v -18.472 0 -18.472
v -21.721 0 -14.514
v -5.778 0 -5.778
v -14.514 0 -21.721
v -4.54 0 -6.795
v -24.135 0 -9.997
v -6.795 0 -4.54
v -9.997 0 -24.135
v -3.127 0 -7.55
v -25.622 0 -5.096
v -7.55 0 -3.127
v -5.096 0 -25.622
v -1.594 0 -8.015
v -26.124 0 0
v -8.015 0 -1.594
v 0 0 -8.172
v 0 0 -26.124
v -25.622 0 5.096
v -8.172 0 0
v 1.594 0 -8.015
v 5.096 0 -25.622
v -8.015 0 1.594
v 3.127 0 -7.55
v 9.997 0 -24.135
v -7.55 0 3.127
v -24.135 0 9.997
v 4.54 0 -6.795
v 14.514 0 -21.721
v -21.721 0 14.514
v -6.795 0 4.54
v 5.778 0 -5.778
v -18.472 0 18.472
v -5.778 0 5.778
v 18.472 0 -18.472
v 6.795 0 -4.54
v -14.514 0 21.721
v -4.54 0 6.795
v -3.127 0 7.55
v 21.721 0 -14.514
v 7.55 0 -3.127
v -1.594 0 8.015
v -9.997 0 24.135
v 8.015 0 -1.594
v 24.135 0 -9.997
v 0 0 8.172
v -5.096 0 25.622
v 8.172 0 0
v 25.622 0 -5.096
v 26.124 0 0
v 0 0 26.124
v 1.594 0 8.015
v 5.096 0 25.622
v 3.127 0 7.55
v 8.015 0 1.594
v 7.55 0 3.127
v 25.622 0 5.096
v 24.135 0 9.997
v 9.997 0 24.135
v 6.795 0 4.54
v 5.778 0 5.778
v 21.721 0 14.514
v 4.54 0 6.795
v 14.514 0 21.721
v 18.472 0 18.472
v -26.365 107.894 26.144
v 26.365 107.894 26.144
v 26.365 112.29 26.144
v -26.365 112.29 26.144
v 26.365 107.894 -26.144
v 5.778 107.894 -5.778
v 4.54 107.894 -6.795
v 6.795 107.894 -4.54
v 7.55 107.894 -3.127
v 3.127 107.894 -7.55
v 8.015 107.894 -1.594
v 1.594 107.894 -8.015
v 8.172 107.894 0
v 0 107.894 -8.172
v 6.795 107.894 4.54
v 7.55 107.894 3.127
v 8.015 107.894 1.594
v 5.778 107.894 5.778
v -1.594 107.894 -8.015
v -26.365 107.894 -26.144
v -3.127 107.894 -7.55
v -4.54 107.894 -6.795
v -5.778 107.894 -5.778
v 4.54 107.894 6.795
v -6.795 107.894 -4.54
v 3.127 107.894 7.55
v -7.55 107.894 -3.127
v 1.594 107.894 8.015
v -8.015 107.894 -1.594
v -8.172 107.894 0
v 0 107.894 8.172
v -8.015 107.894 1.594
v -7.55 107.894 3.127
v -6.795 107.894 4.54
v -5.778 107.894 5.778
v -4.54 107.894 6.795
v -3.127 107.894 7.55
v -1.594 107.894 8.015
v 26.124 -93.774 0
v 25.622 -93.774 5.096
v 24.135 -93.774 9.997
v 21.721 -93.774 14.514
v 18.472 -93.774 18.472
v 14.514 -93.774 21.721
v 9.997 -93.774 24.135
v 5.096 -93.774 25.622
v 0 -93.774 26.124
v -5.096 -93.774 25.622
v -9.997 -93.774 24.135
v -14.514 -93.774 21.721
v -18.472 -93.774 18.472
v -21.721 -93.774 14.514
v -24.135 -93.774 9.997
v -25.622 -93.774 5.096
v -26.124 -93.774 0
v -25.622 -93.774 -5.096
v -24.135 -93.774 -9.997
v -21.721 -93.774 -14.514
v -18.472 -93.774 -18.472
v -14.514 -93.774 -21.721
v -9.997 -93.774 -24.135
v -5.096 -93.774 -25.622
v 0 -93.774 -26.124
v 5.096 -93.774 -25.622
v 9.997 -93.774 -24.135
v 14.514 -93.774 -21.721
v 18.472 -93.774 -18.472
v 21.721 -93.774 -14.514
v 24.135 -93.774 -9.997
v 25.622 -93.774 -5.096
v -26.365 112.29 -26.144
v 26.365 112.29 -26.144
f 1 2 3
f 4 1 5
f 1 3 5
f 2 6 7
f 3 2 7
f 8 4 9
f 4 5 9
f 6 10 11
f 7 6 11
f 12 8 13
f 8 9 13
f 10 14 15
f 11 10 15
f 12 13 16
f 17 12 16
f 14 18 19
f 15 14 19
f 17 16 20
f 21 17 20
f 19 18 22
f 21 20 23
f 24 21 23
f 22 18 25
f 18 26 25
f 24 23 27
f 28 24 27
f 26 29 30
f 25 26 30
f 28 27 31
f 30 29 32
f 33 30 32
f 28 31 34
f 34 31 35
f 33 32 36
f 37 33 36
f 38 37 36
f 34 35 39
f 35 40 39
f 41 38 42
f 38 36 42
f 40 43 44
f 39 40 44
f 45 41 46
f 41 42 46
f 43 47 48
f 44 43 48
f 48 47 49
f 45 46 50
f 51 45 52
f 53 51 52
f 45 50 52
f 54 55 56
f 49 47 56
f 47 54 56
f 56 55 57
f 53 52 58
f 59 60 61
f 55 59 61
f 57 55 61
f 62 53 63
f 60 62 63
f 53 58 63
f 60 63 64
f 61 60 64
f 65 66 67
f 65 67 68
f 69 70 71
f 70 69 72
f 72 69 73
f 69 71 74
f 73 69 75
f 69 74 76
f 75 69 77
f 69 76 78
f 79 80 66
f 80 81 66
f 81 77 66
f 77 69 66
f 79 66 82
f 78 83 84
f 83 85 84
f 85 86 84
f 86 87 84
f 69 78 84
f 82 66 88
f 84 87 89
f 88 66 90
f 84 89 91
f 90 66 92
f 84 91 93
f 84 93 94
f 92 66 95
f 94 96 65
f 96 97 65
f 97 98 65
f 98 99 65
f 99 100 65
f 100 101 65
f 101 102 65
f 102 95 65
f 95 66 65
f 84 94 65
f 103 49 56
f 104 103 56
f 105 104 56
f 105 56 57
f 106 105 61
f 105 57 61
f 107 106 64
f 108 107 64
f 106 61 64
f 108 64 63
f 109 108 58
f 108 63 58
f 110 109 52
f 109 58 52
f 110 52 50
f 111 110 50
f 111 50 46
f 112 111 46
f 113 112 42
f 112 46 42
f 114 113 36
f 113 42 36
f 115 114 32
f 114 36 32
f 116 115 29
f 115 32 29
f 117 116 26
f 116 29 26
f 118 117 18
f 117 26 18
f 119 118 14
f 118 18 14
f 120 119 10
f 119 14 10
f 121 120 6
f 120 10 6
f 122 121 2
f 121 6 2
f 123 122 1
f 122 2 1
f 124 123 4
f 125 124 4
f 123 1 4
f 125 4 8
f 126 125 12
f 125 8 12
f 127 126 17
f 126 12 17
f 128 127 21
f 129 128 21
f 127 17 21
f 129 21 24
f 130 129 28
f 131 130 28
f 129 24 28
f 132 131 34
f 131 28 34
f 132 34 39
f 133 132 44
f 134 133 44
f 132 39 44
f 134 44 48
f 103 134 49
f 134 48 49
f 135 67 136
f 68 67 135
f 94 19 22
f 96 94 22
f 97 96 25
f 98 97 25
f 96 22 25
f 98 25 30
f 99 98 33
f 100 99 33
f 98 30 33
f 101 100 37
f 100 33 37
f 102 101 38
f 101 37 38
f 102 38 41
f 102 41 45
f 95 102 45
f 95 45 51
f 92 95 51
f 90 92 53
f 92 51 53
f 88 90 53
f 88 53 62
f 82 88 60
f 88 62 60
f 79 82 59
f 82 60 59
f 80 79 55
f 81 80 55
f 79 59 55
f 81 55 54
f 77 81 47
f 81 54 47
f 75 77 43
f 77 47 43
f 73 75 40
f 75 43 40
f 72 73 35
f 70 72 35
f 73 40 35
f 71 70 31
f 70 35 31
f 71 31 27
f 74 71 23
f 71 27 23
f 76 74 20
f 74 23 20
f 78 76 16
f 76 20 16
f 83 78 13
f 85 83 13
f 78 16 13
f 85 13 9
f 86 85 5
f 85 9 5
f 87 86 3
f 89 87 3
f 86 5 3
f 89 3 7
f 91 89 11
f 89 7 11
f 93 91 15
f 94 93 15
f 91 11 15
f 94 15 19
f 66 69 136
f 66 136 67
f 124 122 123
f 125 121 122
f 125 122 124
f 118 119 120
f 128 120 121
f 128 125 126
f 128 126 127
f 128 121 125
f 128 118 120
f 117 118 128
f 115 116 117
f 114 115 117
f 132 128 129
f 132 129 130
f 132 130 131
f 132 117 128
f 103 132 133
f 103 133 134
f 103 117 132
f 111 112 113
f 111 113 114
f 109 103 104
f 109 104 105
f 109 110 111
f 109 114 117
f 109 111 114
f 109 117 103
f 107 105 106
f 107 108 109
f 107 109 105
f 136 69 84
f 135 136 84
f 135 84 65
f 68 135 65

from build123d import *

# Parameters (mm, degrees)
F0_R     = 26.123678
F1_DEPTH = 93.77381
F2_R     = 8.171962
F3_DEPTH = 107.8945
F4_W     = 52.7304
F4_H     = 52.288964
F5_DEPTH = 4.39529


with BuildPart() as f1:
    # F0 (on Front) → F1 (new body)
    with BuildSketch(Plane.XZ):
        Circle(F0_R)
    extrude(amount=F1_DEPTH)

    # F2 (on face) → F3 (join)
    with BuildSketch(Plane(origin=(0, 0, 0), x_dir=(-1, 0, 0), z_dir=(0, 1, 0))):
        Circle(F2_R)
    extrude(amount=F3_DEPTH)

    # F4 (on face) → F5 (join)
    with BuildSketch(Plane(origin=(0, 107.8945, 0), x_dir=(-1, 0, 0), z_dir=(0, 1, 0))):
        Rectangle(F4_W, F4_H)
    extrude(amount=F5_DEPTH)


solid = f1.part
